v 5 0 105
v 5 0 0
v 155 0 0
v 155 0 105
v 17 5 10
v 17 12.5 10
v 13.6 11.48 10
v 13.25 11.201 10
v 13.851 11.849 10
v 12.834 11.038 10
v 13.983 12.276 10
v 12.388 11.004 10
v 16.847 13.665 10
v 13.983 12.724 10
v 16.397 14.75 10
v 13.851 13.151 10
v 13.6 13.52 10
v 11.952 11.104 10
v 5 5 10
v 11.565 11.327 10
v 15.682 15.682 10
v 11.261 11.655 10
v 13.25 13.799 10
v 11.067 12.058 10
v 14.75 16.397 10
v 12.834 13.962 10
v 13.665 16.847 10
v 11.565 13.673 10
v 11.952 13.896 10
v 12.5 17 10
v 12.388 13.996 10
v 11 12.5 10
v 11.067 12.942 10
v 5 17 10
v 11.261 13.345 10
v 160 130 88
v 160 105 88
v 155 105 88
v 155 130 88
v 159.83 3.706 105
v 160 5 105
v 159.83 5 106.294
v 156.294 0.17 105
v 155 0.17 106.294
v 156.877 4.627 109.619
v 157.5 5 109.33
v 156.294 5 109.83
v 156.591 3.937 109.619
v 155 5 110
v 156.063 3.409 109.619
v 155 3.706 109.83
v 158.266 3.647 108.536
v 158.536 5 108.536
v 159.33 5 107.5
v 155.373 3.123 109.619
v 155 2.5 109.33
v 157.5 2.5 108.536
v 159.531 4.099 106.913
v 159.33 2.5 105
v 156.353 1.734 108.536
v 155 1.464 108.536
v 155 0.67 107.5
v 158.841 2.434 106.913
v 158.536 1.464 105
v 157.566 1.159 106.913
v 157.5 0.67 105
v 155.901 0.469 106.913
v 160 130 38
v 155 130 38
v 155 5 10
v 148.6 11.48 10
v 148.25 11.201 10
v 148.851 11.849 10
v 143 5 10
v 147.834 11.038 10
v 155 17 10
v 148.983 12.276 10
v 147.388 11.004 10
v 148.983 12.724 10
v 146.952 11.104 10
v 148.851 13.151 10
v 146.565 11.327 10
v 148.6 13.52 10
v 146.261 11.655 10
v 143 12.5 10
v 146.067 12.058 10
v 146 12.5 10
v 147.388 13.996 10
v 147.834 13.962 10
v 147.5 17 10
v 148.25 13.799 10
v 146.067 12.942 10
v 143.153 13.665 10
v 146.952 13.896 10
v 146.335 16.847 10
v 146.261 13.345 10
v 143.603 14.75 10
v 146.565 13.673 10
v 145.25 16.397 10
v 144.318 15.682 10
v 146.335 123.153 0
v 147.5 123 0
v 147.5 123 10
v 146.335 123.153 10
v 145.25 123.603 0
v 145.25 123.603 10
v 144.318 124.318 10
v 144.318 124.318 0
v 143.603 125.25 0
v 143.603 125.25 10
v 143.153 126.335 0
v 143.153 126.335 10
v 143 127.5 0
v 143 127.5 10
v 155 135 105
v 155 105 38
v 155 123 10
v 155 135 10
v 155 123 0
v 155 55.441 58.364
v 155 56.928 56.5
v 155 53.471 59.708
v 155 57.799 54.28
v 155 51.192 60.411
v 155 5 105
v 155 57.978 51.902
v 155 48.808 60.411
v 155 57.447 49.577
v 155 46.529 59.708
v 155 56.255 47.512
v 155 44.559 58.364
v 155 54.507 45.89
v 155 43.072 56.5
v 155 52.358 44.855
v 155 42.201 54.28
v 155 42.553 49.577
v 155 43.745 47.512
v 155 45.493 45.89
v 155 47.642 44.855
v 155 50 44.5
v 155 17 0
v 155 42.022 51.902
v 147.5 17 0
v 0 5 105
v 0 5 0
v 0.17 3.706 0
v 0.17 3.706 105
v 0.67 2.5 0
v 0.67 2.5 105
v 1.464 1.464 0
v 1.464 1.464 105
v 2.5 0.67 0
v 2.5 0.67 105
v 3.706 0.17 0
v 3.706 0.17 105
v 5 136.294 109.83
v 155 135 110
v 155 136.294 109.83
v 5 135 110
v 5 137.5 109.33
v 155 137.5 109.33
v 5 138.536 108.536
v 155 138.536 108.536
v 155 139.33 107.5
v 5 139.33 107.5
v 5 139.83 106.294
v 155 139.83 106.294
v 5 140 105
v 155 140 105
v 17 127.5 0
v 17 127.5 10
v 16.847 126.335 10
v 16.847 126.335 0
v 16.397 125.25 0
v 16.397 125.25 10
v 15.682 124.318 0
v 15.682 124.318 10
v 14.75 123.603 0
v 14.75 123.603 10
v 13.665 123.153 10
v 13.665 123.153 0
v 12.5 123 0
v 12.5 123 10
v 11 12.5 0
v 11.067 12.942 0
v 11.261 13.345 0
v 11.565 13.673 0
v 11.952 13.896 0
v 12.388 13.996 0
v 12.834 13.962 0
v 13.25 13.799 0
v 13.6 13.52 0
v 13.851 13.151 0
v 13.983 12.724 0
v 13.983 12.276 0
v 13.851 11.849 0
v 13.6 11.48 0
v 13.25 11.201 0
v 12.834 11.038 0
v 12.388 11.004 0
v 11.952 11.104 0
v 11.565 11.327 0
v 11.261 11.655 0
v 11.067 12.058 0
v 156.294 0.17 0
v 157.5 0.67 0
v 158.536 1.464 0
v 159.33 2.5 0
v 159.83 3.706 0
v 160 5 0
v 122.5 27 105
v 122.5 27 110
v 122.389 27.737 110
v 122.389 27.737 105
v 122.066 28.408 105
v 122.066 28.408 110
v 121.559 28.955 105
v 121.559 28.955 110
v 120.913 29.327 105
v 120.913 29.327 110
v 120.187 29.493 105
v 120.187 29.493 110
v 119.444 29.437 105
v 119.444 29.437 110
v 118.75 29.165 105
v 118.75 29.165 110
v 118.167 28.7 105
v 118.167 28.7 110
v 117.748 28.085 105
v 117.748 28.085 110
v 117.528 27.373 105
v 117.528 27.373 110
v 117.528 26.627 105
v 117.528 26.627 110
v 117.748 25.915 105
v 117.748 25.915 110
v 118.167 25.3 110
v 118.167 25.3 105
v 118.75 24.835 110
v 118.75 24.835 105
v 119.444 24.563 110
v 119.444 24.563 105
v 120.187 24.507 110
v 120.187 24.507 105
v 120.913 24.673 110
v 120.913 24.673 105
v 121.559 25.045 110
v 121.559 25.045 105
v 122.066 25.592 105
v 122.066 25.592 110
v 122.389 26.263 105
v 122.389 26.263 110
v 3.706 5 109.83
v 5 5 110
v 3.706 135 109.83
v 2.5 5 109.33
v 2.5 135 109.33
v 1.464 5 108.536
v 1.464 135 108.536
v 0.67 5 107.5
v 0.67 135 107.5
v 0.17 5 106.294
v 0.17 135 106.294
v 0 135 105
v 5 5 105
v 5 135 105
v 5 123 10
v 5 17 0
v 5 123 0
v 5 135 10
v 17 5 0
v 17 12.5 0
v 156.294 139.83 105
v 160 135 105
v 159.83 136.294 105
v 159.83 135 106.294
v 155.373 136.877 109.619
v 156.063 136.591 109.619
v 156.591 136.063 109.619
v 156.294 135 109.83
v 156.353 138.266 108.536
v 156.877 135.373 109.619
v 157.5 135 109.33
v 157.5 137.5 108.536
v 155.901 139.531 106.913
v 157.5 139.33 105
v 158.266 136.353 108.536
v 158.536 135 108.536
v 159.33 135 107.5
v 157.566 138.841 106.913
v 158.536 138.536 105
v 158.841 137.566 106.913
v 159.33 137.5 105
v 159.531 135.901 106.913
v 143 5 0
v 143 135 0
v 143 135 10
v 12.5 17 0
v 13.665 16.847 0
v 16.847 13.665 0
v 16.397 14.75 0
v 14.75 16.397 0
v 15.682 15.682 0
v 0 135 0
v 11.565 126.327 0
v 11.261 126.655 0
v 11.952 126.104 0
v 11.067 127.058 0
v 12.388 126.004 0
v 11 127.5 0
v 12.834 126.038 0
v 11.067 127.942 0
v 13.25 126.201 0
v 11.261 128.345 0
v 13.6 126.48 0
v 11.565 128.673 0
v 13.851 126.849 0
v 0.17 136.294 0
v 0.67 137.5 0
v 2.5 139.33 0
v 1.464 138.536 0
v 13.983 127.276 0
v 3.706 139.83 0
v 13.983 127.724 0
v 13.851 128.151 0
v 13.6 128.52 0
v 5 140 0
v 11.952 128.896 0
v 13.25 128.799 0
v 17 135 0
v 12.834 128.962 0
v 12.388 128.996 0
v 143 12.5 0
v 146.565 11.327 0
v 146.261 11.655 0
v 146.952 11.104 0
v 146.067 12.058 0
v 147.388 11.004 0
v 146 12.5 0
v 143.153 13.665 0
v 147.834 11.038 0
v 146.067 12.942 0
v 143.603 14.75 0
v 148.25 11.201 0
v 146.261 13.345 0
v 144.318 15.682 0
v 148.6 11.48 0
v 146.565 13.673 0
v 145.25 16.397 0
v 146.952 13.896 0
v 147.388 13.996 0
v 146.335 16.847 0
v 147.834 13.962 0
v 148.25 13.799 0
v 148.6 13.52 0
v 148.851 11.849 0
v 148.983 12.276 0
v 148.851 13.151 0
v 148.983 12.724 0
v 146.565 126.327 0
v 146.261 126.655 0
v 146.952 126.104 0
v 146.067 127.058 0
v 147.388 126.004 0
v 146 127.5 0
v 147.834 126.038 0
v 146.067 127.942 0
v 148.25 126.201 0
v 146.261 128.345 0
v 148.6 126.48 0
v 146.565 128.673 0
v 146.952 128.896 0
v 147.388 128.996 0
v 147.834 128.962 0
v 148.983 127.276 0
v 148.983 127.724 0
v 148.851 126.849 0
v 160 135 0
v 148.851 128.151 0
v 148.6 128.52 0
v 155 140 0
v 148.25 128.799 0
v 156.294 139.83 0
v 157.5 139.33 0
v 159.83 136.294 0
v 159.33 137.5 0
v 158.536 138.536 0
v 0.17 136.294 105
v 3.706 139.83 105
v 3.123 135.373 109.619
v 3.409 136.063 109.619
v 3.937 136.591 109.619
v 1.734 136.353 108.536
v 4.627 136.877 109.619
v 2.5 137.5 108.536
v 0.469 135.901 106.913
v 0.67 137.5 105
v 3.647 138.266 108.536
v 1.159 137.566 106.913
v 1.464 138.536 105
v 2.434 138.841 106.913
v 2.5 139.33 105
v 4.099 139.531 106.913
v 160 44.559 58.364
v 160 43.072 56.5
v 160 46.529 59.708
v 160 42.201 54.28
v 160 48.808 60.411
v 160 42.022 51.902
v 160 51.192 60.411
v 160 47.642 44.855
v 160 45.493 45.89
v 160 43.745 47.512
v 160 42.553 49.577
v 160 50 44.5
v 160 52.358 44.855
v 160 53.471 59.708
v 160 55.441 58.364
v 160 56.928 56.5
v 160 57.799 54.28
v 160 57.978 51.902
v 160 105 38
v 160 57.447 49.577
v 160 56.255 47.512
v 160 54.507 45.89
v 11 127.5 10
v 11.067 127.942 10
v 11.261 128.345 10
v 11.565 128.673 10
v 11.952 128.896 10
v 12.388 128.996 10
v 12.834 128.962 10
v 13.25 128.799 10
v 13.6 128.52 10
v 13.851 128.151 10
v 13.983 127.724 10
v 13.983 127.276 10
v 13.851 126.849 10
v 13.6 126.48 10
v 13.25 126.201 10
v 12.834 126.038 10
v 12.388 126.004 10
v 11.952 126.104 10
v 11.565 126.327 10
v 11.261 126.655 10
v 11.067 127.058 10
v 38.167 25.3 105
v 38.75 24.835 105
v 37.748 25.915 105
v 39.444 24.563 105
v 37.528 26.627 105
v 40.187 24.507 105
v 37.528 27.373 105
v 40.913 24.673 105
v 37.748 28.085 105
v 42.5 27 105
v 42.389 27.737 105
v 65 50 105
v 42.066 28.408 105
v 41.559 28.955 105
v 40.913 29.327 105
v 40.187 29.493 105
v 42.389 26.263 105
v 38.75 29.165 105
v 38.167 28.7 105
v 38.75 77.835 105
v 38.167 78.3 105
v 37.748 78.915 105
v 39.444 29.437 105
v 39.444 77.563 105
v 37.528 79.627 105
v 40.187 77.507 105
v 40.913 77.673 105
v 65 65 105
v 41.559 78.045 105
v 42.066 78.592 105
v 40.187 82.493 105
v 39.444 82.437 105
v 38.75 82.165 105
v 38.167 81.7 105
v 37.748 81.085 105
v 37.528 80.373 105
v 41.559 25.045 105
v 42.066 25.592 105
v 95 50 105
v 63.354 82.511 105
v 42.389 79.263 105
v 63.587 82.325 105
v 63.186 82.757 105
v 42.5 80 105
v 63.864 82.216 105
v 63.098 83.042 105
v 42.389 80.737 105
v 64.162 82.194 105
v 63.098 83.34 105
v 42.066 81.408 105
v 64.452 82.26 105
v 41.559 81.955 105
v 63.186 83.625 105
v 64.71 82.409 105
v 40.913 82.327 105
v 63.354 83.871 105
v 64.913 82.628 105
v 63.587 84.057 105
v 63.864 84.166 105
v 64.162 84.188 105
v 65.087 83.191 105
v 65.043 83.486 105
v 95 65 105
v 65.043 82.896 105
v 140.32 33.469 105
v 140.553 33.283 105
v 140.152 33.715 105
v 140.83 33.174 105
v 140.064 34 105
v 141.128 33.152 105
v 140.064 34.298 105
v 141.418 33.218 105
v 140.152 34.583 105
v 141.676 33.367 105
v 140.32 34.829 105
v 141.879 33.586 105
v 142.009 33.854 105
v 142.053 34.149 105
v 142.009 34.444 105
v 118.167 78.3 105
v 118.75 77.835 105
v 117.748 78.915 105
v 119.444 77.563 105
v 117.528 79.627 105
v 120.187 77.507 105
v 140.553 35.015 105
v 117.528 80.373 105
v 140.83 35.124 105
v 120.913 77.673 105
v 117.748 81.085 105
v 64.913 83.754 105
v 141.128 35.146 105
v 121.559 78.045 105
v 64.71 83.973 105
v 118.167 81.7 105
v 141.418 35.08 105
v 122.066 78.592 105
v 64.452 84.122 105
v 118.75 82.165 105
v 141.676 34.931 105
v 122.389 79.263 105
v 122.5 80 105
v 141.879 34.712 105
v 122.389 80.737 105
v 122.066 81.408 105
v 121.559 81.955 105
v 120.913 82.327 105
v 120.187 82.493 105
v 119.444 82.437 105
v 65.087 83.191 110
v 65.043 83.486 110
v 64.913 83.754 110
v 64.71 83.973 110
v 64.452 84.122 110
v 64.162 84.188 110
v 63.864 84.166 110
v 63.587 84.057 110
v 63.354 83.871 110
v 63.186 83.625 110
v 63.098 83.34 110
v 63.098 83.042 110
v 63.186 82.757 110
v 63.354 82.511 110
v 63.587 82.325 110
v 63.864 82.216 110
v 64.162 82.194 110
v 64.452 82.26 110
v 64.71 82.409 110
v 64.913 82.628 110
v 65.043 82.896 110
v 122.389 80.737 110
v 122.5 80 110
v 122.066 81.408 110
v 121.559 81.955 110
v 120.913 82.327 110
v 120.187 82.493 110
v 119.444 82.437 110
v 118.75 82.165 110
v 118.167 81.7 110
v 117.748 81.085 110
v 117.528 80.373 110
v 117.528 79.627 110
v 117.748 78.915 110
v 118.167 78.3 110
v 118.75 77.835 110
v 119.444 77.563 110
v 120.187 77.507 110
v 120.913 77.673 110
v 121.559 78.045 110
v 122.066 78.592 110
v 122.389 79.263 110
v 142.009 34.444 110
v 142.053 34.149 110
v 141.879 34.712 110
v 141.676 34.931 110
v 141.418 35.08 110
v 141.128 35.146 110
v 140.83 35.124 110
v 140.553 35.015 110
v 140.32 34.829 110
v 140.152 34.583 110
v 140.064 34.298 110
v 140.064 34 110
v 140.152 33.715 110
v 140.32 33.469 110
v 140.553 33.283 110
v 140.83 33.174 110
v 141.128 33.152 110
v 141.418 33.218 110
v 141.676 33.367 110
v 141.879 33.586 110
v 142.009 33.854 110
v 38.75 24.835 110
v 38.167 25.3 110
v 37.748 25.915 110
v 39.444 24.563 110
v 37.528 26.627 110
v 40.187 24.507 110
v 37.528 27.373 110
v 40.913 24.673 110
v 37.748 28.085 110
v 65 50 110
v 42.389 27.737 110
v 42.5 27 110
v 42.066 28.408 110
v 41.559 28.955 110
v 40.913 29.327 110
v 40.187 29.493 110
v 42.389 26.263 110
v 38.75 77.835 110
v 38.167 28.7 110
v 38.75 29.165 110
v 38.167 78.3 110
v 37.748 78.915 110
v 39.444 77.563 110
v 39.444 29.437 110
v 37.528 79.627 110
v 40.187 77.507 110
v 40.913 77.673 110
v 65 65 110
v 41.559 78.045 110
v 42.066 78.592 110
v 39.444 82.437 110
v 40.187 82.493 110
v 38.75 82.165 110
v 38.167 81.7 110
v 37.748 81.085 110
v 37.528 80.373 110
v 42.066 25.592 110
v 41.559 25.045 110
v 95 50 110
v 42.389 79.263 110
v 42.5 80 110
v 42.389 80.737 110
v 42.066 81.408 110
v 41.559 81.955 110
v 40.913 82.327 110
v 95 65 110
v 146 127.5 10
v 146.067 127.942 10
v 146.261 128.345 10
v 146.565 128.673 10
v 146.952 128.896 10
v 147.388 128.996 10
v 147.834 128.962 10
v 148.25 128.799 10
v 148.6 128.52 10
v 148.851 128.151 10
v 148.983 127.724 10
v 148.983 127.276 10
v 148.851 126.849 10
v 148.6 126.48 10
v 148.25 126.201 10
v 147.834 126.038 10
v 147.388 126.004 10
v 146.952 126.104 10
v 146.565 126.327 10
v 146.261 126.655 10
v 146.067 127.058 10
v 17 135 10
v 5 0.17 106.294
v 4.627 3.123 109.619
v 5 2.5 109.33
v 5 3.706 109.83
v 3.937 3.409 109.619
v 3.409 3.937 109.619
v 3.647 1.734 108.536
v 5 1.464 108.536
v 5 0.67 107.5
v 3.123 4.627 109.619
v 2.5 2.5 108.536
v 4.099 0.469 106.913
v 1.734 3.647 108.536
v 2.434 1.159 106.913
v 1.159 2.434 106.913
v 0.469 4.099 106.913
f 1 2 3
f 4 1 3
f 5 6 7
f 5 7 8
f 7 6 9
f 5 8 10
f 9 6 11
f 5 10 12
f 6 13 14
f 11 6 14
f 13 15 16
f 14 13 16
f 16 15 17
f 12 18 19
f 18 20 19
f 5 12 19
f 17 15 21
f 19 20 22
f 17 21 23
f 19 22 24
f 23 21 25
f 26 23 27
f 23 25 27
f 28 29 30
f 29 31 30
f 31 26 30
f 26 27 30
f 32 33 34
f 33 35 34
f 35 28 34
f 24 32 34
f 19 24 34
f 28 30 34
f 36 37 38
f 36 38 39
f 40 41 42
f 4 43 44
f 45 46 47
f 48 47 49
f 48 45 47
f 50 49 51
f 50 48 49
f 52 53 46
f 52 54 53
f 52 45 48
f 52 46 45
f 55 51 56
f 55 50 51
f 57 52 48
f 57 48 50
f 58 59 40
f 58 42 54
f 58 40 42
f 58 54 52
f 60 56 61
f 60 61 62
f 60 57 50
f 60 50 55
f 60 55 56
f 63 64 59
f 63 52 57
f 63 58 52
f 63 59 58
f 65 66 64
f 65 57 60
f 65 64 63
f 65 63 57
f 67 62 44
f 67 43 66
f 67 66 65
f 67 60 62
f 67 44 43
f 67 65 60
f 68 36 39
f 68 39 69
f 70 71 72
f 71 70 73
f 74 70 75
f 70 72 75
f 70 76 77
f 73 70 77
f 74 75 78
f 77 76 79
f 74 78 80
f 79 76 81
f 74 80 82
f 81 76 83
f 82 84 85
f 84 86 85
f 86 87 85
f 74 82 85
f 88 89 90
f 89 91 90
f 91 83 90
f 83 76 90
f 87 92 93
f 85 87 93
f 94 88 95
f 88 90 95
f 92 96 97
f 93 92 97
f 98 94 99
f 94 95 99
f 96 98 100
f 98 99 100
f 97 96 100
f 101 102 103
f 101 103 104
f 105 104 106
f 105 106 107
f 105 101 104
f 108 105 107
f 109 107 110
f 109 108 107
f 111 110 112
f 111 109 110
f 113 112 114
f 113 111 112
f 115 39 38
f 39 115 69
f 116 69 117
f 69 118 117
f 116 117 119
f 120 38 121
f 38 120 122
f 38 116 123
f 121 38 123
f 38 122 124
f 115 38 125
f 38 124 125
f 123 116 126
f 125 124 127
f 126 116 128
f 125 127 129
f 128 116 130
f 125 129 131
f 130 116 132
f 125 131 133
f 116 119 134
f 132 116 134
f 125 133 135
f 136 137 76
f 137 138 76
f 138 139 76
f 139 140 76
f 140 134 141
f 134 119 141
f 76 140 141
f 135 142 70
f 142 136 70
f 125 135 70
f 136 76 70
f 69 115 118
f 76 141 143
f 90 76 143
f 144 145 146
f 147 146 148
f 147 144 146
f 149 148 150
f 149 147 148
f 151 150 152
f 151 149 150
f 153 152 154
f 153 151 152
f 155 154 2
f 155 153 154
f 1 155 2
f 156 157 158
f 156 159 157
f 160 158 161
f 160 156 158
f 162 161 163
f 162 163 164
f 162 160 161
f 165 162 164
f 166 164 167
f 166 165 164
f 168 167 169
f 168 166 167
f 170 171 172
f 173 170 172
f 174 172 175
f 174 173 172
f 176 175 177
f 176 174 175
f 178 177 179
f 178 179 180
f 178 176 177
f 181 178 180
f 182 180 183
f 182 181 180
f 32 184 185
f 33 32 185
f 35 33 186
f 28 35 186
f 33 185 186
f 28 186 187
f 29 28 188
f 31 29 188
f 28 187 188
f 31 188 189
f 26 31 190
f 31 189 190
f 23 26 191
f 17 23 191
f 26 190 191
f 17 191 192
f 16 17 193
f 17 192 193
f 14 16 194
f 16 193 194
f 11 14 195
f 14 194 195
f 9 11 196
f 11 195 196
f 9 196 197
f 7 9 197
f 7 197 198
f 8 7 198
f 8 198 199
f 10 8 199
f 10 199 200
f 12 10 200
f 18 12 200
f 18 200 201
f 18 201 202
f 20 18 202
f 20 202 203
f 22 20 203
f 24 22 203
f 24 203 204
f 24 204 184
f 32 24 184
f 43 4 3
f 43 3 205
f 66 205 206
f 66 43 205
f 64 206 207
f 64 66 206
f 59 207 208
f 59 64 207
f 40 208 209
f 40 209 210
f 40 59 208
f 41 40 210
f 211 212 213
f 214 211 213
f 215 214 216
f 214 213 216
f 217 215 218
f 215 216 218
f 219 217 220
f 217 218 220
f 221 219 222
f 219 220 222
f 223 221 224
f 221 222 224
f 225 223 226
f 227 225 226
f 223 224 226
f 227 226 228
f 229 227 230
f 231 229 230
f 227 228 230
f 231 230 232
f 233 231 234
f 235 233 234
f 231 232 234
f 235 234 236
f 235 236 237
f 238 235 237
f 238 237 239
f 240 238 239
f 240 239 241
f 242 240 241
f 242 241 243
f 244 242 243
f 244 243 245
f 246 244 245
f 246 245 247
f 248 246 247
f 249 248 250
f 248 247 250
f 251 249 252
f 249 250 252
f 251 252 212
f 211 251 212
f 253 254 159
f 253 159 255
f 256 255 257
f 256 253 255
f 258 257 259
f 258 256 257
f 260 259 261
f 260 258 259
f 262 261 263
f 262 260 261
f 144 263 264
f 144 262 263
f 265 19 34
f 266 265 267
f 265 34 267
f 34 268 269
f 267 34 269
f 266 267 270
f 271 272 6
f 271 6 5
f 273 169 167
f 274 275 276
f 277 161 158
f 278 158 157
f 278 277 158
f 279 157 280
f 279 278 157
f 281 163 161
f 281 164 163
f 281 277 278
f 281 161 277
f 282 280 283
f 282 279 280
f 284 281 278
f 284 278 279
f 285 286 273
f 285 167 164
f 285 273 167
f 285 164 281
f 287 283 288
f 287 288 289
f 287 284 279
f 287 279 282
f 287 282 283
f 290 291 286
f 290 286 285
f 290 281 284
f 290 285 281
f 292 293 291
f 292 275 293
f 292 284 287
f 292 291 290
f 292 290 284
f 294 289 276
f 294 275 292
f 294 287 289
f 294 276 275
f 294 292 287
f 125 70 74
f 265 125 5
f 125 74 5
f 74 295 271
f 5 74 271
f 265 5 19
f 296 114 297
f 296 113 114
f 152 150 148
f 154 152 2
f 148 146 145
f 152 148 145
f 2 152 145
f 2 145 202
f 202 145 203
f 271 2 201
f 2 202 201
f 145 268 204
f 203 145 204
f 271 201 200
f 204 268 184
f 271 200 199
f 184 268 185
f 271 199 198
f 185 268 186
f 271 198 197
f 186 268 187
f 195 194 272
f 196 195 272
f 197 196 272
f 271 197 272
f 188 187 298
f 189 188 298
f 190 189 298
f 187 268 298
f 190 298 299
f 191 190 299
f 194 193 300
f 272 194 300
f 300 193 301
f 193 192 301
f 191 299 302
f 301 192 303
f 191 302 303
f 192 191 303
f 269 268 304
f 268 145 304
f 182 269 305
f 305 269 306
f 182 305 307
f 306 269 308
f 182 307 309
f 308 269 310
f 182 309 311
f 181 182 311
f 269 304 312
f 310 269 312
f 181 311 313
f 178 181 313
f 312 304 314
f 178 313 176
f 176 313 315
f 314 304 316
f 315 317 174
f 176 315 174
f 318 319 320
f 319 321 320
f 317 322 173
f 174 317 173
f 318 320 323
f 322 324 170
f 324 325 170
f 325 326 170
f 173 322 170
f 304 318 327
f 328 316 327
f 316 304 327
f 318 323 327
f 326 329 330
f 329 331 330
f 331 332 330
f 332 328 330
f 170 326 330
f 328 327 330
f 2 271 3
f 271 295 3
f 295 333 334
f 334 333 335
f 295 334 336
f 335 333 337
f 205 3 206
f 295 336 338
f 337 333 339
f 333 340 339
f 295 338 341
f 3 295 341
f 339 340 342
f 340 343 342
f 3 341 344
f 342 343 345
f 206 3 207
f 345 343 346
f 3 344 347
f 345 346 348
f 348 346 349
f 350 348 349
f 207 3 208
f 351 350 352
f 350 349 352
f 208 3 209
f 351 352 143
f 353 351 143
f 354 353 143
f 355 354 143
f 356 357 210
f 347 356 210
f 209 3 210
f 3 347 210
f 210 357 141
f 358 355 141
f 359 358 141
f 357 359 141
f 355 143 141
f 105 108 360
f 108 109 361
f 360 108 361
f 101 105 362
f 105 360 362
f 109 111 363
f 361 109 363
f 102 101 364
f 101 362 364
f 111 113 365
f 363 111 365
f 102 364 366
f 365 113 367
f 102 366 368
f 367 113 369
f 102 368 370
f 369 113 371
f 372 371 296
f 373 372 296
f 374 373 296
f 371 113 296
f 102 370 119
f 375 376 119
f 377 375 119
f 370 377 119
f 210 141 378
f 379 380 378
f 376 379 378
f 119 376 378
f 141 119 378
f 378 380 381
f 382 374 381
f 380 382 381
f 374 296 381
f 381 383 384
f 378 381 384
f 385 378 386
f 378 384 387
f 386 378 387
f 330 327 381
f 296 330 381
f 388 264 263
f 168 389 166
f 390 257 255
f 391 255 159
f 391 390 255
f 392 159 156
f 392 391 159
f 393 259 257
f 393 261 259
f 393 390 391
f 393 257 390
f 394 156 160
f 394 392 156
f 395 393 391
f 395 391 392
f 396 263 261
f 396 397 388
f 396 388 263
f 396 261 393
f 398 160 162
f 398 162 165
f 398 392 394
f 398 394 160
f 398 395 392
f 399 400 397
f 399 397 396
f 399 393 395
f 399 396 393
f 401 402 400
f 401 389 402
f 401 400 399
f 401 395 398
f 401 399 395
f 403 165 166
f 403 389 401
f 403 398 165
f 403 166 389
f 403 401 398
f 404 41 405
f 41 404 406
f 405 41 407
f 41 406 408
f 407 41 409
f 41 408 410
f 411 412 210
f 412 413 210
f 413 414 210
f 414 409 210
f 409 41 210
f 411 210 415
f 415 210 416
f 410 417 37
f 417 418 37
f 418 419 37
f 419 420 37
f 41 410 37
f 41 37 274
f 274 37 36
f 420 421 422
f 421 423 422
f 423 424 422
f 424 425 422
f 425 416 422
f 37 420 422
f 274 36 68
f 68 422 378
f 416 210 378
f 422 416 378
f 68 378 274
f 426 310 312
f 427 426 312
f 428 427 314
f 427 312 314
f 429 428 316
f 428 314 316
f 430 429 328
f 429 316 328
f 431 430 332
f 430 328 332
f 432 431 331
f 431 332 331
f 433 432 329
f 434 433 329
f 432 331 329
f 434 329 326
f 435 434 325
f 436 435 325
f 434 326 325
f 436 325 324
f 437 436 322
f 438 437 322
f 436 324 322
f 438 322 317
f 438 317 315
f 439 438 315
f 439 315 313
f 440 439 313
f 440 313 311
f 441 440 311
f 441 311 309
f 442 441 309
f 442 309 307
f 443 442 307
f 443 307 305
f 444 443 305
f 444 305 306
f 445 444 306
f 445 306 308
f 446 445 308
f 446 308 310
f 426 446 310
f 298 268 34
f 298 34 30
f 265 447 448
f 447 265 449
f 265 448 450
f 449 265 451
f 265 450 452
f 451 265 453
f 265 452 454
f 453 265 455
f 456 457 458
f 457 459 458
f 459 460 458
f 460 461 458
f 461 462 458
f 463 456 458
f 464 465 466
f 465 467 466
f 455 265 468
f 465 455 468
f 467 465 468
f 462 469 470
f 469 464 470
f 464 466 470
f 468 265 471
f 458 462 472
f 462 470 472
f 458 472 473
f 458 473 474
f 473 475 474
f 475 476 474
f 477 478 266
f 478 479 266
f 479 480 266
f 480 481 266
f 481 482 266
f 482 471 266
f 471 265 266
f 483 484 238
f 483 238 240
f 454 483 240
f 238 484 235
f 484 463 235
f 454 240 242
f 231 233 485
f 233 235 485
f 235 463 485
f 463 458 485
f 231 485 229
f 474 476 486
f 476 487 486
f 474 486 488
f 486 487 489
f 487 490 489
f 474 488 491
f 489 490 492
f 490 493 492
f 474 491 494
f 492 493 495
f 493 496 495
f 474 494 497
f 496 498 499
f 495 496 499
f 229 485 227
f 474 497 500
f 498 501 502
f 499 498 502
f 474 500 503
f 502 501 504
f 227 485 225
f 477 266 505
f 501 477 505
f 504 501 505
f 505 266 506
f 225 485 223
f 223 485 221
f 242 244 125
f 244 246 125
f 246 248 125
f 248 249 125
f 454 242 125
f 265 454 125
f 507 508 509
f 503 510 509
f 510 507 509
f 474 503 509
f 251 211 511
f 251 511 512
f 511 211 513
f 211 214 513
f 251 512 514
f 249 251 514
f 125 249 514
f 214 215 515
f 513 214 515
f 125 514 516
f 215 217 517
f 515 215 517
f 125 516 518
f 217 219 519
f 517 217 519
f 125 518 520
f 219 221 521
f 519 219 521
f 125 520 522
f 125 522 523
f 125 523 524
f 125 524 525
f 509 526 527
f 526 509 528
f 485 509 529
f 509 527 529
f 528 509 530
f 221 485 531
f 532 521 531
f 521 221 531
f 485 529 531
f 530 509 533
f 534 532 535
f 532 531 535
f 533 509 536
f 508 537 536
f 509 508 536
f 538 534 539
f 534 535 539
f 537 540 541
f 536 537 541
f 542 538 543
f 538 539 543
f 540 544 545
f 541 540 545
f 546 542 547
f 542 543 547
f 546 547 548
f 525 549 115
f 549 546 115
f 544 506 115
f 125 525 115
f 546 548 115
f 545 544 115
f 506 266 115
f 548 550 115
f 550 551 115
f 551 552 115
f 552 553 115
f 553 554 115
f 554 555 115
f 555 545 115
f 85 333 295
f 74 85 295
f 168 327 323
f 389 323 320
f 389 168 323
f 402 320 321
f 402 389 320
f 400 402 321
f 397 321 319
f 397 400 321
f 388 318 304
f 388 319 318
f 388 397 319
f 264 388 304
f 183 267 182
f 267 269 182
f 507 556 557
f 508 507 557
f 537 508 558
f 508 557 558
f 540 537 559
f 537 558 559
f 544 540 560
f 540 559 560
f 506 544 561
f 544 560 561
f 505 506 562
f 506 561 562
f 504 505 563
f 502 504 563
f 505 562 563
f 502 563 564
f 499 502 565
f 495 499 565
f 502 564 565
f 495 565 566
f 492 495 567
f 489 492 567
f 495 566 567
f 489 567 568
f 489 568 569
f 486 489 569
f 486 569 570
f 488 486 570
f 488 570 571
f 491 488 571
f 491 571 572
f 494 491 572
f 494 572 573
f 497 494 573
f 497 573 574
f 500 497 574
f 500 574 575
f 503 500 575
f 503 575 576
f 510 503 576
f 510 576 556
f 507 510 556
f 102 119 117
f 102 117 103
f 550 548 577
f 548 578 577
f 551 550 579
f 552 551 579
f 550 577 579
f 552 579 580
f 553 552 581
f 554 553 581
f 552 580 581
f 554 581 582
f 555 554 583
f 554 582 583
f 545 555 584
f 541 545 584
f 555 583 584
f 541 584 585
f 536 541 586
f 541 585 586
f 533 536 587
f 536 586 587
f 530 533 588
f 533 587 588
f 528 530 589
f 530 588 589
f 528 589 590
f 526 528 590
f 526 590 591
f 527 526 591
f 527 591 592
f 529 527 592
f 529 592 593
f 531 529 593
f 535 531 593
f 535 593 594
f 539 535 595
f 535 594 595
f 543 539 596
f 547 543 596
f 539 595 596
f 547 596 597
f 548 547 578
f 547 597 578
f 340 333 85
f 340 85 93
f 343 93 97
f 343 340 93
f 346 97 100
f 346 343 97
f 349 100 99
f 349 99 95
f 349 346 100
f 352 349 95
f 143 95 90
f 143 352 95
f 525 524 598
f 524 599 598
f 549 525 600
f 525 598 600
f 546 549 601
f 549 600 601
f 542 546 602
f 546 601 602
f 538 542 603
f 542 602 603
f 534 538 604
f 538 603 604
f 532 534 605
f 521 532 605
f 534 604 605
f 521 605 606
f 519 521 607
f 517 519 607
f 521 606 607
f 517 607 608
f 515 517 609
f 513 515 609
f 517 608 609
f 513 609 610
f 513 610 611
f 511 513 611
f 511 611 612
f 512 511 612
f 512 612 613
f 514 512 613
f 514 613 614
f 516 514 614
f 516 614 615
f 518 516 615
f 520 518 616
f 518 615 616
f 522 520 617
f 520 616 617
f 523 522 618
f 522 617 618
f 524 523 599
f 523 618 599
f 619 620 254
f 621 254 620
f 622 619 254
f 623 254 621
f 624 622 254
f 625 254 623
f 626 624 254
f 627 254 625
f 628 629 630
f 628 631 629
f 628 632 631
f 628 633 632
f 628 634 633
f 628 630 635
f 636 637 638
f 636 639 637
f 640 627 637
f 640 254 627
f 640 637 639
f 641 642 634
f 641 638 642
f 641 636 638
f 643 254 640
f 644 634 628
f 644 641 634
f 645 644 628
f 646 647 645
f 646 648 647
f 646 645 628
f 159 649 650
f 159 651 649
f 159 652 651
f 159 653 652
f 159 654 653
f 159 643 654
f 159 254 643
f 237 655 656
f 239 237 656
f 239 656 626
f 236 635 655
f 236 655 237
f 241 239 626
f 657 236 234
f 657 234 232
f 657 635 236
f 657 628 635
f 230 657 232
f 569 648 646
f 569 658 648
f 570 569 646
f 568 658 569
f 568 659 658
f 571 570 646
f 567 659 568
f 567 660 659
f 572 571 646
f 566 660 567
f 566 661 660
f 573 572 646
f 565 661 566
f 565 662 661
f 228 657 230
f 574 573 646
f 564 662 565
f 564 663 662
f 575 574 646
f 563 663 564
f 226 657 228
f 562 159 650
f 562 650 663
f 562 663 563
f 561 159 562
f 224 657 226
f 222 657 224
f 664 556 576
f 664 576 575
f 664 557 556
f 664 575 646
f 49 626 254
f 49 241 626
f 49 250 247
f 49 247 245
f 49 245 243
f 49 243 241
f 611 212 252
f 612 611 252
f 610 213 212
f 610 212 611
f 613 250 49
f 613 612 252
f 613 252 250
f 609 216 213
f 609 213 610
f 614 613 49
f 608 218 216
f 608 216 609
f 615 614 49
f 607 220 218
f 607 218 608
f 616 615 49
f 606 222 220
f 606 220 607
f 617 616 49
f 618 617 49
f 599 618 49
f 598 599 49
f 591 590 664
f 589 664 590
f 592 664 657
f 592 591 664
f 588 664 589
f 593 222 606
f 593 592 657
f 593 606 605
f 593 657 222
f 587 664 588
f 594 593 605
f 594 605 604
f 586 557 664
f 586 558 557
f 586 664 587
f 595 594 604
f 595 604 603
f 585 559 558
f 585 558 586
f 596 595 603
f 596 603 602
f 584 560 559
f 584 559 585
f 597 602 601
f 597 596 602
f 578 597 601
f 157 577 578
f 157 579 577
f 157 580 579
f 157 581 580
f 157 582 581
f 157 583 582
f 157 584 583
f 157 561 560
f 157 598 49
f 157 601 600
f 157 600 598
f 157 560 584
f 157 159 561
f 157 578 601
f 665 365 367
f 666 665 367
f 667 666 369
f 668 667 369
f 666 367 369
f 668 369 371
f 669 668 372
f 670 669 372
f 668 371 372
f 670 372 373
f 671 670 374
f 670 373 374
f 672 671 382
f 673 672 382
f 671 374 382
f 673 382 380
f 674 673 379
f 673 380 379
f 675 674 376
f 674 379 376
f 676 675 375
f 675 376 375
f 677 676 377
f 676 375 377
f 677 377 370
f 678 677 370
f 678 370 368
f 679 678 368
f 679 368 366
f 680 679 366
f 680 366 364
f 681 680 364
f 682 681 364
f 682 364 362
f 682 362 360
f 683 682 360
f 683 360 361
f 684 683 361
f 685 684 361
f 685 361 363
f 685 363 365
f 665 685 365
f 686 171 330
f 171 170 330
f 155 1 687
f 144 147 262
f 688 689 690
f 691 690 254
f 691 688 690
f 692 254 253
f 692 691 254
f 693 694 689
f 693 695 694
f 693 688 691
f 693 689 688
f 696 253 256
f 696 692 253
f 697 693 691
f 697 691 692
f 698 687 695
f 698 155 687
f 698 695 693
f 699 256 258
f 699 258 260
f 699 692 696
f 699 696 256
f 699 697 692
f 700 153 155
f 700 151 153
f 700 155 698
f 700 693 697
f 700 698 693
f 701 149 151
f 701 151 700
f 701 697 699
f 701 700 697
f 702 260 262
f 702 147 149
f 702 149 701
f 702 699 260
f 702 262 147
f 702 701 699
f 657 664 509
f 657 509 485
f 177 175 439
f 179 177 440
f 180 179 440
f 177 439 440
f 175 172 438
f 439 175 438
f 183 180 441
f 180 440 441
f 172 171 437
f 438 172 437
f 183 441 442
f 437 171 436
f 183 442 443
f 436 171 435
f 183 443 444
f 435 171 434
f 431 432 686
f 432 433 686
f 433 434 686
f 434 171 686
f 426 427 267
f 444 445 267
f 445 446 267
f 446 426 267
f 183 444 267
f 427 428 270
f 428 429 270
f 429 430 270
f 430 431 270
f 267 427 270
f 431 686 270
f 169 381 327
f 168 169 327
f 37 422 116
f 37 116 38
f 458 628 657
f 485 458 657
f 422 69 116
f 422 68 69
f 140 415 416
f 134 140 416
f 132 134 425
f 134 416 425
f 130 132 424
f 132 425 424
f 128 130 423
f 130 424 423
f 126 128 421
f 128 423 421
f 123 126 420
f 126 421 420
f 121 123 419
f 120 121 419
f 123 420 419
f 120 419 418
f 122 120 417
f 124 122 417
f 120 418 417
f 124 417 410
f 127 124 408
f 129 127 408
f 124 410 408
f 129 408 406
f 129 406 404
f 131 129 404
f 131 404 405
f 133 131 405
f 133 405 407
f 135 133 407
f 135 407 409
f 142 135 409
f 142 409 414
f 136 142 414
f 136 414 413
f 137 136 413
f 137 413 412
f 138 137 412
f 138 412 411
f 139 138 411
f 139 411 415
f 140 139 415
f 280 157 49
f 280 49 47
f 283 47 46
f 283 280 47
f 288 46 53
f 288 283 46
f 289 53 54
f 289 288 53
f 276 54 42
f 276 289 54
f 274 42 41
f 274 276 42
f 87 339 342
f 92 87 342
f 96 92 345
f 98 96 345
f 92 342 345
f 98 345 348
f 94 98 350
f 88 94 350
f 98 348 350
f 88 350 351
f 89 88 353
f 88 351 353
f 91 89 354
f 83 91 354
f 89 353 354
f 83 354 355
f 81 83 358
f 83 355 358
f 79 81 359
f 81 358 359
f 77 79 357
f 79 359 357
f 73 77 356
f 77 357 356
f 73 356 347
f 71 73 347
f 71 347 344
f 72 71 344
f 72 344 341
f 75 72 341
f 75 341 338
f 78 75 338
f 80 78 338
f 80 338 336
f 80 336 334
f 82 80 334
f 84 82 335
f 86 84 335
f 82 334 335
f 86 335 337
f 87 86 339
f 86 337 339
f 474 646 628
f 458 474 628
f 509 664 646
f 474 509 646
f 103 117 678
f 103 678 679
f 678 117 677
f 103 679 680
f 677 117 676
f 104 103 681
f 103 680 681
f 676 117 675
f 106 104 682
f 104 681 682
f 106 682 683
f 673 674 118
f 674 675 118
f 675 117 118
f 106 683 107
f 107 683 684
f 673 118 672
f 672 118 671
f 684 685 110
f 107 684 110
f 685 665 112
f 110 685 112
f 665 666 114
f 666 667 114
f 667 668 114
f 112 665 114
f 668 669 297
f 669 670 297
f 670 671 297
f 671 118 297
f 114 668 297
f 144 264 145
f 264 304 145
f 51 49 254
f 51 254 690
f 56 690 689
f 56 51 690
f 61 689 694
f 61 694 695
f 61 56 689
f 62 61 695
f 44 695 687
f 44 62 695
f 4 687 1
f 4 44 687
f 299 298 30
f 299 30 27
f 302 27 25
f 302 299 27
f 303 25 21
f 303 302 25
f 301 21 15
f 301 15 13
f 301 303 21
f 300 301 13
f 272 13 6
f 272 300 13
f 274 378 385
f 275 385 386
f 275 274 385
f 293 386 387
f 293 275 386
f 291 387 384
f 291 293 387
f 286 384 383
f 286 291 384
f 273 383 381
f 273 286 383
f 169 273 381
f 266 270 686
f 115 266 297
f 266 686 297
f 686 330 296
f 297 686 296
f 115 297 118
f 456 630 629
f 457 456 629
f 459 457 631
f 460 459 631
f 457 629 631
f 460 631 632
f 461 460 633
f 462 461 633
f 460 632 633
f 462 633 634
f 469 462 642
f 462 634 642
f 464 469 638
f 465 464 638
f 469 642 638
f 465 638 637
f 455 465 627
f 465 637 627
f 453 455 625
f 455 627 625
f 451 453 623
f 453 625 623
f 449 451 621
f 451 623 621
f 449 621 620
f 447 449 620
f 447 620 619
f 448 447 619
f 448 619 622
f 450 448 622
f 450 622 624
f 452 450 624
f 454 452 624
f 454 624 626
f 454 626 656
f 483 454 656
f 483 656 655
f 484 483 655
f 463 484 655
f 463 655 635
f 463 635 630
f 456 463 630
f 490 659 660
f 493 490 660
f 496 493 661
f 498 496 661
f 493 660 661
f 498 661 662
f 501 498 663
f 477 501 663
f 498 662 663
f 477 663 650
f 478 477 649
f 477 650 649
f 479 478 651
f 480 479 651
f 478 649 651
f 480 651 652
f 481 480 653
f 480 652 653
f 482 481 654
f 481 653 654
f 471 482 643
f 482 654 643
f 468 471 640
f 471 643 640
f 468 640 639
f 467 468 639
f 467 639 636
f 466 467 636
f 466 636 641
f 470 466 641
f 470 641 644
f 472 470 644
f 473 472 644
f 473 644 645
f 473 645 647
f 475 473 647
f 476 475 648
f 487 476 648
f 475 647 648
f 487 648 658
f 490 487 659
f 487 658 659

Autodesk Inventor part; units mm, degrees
ref_plane "YZ Plane" through (0, 0, 0) normal (1, 0, 0) x (0, 1, 0)
ref_plane "XZ Plane" through (0, 0, 0) normal (0, 1, 0) x (-1, 0, 0)
ref_plane "XY Plane" through (0, 0, 0) normal (0, 0, 1) x (1, 0, 0)
sketch "Sketch1" plane through (0, 0, 0) normal (0, 0, 1) x (1, 0, 0)
  line L0 (0, 0) -> (160, 0)
  line L1 (160, 0) -> (160, 140)
  line L2 (160, 140) -> (0, 140)
  line L3 (0, 140) -> (0, 0)
  line L4 (5, 135) -> (155, 135)
  line L5 (155, 135) -> (155, 5)
  line L6 (155, 5) -> (5, 5)
  line L7 (5, 5) -> (5, 135)
  dimension "d0" = 160
  dimension "d1" = 140
  dimension "d2" = 5
extrude "Extrusion1" add sketch "Sketch1" along normal blind 110
sketch "Sketch2" plane through (0, 0, 110) normal (0, 0, 1) x (1, 0, 0)
  line L0 (160, 0) -> (160, 140) projected
  line L1 (160, 140) -> (0, 140) projected
  line L2 (0, 140) -> (0, 0) projected
  line L3 (0, 0) -> (160, 0) projected
  line L4 (5, 135) -> (155, 135) projected
  line L5 (155, 135) -> (155, 5) projected
  line L6 (155, 5) -> (5, 5) projected
  line L7 (5, 5) -> (5, 135) projected
extrude "Extrusion2" add sketch "Sketch2" against normal blind 5 contours L4 L5 L6 L7
sketch "Sketch4" plane through (160, 0, 0) normal (1, 0, 0) x (0, 0, -1)
  line L0 (0, 0) -> (0, 140) projected
  line L1 (0, 140) -> (-110, 140) projected
  line L2 (-110, 0) -> (-110, 140) projected
  line L3 (0, 0) -> (-110, 0) projected
  line L4 (-110, 140) -> (-110, 130)
  line L5 (-110, 130) -> (-88, 130)
  line L6 (-88, 130) -> (-38, 130)
  line L7 (-38, 130) -> (-38, 105)
  line L8 (-38, 105) -> (-88, 105)
  line L9 (-88, 105) -> (-88, 130)
  point P0 (0, 0)
  dimension "d7" = 10
  dimension "d8" = 22
  dimension "d9" = 50
  dimension "d10" = 25
extrude "Extrusion3" cut sketch "Sketch4" against normal blind 5 contours L6 L7 L8 L9
sketch "Sketch5" plane through (0, 0, 110) normal (0, 0, 1) x (1, 0, 0)
  line L0 (160, 0) -> (160, 140) projected
  line L1 (160, 140) -> (0, 140) projected
  line L2 (0, 140) -> (0, 0) projected
  line L3 (0, 0) -> (160, 0) projected
  line L4 (80, 140) -> (80, 90)
  line L5 (80, 90) -> (30, 90)
  line L6 (30, 90) -> (30, 17)
  line L7 (30, 17) -> (80, 17)
  line L8 (80, 17) -> (80, 90)
  line L9 (80, 90) -> (130, 90)
  line L10 (130, 90) -> (130, 17)
  line L11 (130, 17) -> (80, 17)
  line L12 (130, 17) -> (120, 17)
  line L13 (120, 17) -> (120, 27)
  circle A0 centre (120, 27) radius 2.5
  line L14 (130, 53.5) -> (125, 53.5)
  circle A1 centre (40, 27) radius 2.5
  circle A2 centre (120, 80) radius 2.5
  circle A3 centre (40, 80) radius 2.5
  dimension "d13" = 50
  dimension "d14" = 50
  dimension "d15" = 73
  dimension "d16" = 10
  dimension "d17" = 10
  dimension "d18" = 5
  dimension "d19" = 5
extrude "Extrusion4" cut sketch "Sketch5" against normal blind 5 contours A0 | A1 | A2 | A3
sketch "Sketch6" plane through (0, 0, 110) normal (0, 0, 1) x (1, 0, 0)
  circle A0 centre (120, 80) radius 2.5 projected
  circle A1 centre (40, 27) radius 2.5 projected
  circle A2 centre (40, 80) radius 2.5 projected
  circle A3 centre (120, 27) radius 2.5 projected
  line L0 (160, 0) -> (160, 140) projected
  line L1 (160, 140) -> (0, 140) projected
  line L2 (0, 140) -> (0, 0) projected
  line L3 (0, 0) -> (160, 0) projected
  line L4 (160, 0) -> (141.053, 0)
  line L5 (0, 0) -> (160, 0) projected
  line L6 (141.053, 0) -> (141.053, 34.149)
  circle A4 centre (141.053, 34.149) radius 1
  line L7 (0, 140) -> (64.087, 140)
  line L8 (64.087, 140) -> (64.087, 83.191)
  circle A5 centre (64.087, 83.191) radius 1
  dimension "d22" = 18.947
  dimension "d23" = 34.149
  dimension "d24" = 2
  dimension "d28" = 64.087
  dimension "d29" = 56.809
  dimension "d30" = 2
extrude "Extrusion5" cut sketch "Sketch6" against normal blind 5 contours A5 | A4
fillet "Fillet1" radius 5 8 edges at (160, 0, 55) (0, 0, 55) (160, 140, 55) (0, 140, 55) (80, 0, 110) (0, 70, 110) (80, 140, 110) (160, 70, 110)
sketch "Sketch7" plane through (0, 0, 0) normal (0, 0, -1) x (-1, 0, 0)
  line L0 (-5, 135) -> (-155, 135) projected
  line L1 (-5, 5) -> (-5, 135) projected
  line L2 (-155, 5) -> (-5, 5) projected
  line L3 (-155, 135) -> (-155, 5) projected
  arc A0 (0, 135) -> (-5, 140) centre (-5, 135) ccw projected
  line L4 (-155, 140) -> (-5, 140) projected
  arc A1 (-155, 140) -> (-160, 135) centre (-155, 135) ccw projected
  line L5 (-160, 5) -> (-160, 135) projected
  arc A2 (-160, 5) -> (-155, 0) centre (-155, 5) ccw projected
  line L6 (-5, 0) -> (-155, 0) projected
  arc A3 (-5, 0) -> (0, 5) centre (-5, 5) ccw projected
  line L7 (0, 135) -> (0, 5) projected
  line L8 (-5, 135) -> (-12.5, 135)
  line L9 (-12.5, 135) -> (-12.5, 127.5)
  line L10 (-12.5, 127.5) -> (-5, 127.5)
  line L11 (-5, 127.5) -> (-5, 135)
  circle A4 centre (-12.5, 127.5) radius 1.5
  line L12 (-80, 135) -> (-80, 130)
  line L13 (-5, 70) -> (-10, 70)
  circle A5 centre (-147.5, 127.5) radius 1.5
  circle A6 centre (-12.5, 12.5) radius 1.5
  circle A7 centre (-147.5, 12.5) radius 1.5
  circle A8 centre (-12.5, 127.5) radius 4.5
  line L14 (-5, 123) -> (-12.5, 123)
  line L15 (-5, 5) -> (-5, 135) projected
  line L16 (-17, 127.5) -> (-17, 135)
  circle A9 centre (-147.5, 127.5) radius 4.5
  line L17 (-155, 123) -> (-147.5, 123)
  line L18 (-143, 127.5) -> (-143, 135)
  circle A10 centre (-12.5, 12.5) radius 4.5
  line L19 (-5, 17) -> (-12.5, 17)
  line L20 (-17, 12.5) -> (-17, 5)
  circle A11 centre (-147.5, 12.5) radius 4.5
  line L21 (-143, 12.5) -> (-143, 5)
  line L22 (-155, 17) -> (-147.5, 17)
  point P0 (0, 0)
  dimension "d31" = 7.5
  dimension "d32" = 7.5
  dimension "d33" = 3
  dimension "d34" = 5
  dimension "d35" = 5
  dimension "d36" = 3
extrude "Extrusion6" add sketch "Sketch7" against normal blind 10 contours L1 L10 A8 L9 L0 | L9 A8 L16 L0 | L1 L14 A8 L10 | A8 L10 A4 L9 | L9 A4 L10 A8 | L18 A9 L17 L3 L0 | L1 L2 L20 A10 L19 | A9 | A10 | L22 A11 L21 L2 L3 | A11
sketch "Sketch8" plane through (0, 0, 110) normal (0, 0, 1) x (1, 0, 0)
  line L0 (155, 140) -> (5, 140) projected
  line L1 (80, 140) -> (80, 65)
  line L2 (80, 65) -> (65, 65)
  line L3 (65, 65) -> (65, 50)
  line L4 (65, 50) -> (80, 50)
  line L5 (80, 50) -> (80, 65)
  line L6 (80, 65) -> (95, 65)
  line L7 (95, 65) -> (95, 50)
  line L8 (95, 50) -> (80, 50)
  point P0 (0, 0)
  dimension "d39" = 75
  dimension "d40" = 15
  dimension "d41" = 15
extrude "Extrusion7" cut sketch "Sketch8" against normal blind 10
sketch "Sketch9" plane through (160, 5, 0) normal (1, 0, 0) x (0, 0, -1)
  line L0 (0, 135) -> (-105, 135) projected
  line L1 (-110, 130) -> (-110, 0) projected
  line L2 (-105, -5) -> (0, -5) projected
  line L3 (-52.5, 135) -> (-52.5, 45)
  circle A0 centre (-52.5, 45) radius 8
  dimension "d44" = 90
  dimension "d45" = 16
extrude "Extrusion8" cut sketch "Sketch9" against normal blind 10
properties part number "BoxIoT"
